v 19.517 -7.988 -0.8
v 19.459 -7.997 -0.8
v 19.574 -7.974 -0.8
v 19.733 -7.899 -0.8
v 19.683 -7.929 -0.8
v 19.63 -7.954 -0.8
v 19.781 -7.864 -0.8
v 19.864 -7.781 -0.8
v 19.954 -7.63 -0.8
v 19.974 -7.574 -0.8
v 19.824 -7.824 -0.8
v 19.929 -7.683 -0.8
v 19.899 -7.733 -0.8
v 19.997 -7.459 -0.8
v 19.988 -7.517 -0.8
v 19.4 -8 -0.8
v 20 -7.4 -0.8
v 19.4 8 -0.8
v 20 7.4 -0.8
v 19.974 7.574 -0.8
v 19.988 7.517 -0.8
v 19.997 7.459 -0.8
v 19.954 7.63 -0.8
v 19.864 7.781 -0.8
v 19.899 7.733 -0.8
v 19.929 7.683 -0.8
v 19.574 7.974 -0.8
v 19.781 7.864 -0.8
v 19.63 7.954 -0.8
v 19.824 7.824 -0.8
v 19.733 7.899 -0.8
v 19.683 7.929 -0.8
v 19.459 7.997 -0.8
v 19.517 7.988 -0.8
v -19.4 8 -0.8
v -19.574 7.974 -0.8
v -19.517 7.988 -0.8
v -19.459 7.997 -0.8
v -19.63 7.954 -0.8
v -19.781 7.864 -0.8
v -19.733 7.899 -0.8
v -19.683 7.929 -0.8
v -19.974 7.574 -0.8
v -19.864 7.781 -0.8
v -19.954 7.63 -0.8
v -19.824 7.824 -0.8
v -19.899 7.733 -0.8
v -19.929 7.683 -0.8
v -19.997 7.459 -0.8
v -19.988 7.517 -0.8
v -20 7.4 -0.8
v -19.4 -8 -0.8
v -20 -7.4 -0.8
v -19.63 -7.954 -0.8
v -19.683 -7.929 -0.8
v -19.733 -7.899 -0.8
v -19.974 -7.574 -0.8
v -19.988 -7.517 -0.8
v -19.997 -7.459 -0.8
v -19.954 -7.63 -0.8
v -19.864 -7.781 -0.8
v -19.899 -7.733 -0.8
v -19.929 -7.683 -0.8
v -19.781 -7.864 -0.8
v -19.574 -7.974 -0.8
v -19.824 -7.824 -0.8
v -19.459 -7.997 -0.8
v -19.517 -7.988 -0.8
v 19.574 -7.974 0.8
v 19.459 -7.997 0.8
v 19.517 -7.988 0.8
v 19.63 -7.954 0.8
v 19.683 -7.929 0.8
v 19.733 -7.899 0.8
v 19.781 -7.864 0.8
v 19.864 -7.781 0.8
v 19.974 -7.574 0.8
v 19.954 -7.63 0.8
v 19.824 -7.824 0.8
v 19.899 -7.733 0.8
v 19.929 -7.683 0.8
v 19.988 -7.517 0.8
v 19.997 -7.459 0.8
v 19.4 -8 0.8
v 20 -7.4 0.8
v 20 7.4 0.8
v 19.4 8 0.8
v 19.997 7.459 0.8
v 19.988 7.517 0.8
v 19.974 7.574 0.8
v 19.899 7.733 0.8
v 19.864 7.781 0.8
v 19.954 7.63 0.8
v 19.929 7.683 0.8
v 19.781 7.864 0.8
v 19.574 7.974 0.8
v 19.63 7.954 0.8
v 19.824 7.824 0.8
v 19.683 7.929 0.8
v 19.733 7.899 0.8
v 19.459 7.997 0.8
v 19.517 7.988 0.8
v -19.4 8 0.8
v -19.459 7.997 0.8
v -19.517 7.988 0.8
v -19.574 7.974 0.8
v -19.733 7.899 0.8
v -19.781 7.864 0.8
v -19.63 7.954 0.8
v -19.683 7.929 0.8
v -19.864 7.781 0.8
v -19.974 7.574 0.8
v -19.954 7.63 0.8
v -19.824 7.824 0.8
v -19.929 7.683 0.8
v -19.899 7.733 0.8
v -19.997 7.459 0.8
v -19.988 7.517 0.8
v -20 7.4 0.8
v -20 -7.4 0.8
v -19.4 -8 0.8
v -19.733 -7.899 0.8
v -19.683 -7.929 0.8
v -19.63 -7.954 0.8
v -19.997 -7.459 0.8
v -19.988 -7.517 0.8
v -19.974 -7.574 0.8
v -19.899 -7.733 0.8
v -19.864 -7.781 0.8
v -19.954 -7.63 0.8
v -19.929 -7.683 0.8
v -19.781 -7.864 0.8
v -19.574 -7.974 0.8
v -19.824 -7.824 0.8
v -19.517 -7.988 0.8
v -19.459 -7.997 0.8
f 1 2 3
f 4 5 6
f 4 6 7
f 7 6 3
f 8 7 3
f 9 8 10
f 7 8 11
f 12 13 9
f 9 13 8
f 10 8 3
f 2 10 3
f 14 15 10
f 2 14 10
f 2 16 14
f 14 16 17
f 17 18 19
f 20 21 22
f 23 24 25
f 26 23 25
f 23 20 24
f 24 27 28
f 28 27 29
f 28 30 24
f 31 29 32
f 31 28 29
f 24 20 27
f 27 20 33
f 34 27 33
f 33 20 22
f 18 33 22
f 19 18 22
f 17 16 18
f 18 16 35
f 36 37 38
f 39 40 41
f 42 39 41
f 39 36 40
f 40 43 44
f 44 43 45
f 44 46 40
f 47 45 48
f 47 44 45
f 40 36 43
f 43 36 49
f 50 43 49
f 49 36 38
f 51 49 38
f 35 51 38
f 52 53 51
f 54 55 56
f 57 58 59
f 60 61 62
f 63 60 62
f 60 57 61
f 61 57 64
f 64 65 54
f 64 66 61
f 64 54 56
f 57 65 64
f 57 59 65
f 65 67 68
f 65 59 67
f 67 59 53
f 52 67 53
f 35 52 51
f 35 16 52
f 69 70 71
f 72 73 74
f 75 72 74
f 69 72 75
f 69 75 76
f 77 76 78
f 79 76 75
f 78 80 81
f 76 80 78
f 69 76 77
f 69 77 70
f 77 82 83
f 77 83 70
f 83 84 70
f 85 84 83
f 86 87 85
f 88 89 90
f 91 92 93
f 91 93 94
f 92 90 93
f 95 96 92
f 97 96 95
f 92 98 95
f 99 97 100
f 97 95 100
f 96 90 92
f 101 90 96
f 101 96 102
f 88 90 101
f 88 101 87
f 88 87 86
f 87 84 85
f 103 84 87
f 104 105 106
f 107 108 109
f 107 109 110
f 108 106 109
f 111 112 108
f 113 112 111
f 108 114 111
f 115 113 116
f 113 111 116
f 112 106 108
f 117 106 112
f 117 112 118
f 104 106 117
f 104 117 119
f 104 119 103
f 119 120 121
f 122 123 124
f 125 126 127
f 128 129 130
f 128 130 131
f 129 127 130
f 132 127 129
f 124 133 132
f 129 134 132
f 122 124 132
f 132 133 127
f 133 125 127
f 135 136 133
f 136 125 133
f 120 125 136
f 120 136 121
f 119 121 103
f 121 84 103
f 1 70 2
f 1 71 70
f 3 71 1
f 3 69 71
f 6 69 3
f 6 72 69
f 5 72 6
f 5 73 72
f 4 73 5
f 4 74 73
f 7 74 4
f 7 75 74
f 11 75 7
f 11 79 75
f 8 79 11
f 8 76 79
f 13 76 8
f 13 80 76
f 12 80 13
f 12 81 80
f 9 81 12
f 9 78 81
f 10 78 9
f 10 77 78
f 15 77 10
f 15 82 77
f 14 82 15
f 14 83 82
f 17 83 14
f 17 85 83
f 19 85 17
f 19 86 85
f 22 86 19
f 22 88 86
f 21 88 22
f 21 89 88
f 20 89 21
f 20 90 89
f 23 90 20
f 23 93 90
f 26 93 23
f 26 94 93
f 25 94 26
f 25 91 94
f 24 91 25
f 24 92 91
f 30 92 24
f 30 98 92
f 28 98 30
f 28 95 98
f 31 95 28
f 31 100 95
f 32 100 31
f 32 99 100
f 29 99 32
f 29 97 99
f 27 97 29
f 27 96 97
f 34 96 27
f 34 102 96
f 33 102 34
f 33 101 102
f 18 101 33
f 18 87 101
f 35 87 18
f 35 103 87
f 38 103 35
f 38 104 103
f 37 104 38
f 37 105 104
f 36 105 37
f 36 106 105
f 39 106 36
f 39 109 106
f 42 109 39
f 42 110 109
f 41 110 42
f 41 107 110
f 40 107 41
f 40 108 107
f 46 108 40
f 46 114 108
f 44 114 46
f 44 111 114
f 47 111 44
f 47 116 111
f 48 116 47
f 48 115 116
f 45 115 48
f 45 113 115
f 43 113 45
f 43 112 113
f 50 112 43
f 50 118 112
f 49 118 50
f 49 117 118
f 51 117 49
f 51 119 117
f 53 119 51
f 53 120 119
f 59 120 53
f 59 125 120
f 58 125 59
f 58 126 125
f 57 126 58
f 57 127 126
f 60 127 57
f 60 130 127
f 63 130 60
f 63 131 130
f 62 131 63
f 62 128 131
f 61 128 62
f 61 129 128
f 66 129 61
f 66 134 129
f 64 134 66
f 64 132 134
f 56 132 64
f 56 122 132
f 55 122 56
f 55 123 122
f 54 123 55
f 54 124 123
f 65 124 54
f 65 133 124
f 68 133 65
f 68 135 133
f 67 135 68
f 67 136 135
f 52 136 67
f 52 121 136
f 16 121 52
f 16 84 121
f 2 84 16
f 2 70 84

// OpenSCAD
$fn = 64;

// Exact target dimensions (mm)
pcb_length    = 40.0;
pcb_width     = 16.0;
pcb_thickness = 1.6;

// Small epsilon to avoid coplanar artifacts while keeping one connected solid
eps = 0.02;

// PCB as ONE connected solid with slightly rounded corners (still exact overall size)
module pcb_plate() {
    color([0.0, 0.4, 0.2])
    linear_extrude(height = pcb_thickness, center = true, convexity = 10)
        offset(r = 0.6)
            square([pcb_length - 2*0.6, pcb_width - 2*0.6], center = true);
}

// Final output
pcb_plate();
